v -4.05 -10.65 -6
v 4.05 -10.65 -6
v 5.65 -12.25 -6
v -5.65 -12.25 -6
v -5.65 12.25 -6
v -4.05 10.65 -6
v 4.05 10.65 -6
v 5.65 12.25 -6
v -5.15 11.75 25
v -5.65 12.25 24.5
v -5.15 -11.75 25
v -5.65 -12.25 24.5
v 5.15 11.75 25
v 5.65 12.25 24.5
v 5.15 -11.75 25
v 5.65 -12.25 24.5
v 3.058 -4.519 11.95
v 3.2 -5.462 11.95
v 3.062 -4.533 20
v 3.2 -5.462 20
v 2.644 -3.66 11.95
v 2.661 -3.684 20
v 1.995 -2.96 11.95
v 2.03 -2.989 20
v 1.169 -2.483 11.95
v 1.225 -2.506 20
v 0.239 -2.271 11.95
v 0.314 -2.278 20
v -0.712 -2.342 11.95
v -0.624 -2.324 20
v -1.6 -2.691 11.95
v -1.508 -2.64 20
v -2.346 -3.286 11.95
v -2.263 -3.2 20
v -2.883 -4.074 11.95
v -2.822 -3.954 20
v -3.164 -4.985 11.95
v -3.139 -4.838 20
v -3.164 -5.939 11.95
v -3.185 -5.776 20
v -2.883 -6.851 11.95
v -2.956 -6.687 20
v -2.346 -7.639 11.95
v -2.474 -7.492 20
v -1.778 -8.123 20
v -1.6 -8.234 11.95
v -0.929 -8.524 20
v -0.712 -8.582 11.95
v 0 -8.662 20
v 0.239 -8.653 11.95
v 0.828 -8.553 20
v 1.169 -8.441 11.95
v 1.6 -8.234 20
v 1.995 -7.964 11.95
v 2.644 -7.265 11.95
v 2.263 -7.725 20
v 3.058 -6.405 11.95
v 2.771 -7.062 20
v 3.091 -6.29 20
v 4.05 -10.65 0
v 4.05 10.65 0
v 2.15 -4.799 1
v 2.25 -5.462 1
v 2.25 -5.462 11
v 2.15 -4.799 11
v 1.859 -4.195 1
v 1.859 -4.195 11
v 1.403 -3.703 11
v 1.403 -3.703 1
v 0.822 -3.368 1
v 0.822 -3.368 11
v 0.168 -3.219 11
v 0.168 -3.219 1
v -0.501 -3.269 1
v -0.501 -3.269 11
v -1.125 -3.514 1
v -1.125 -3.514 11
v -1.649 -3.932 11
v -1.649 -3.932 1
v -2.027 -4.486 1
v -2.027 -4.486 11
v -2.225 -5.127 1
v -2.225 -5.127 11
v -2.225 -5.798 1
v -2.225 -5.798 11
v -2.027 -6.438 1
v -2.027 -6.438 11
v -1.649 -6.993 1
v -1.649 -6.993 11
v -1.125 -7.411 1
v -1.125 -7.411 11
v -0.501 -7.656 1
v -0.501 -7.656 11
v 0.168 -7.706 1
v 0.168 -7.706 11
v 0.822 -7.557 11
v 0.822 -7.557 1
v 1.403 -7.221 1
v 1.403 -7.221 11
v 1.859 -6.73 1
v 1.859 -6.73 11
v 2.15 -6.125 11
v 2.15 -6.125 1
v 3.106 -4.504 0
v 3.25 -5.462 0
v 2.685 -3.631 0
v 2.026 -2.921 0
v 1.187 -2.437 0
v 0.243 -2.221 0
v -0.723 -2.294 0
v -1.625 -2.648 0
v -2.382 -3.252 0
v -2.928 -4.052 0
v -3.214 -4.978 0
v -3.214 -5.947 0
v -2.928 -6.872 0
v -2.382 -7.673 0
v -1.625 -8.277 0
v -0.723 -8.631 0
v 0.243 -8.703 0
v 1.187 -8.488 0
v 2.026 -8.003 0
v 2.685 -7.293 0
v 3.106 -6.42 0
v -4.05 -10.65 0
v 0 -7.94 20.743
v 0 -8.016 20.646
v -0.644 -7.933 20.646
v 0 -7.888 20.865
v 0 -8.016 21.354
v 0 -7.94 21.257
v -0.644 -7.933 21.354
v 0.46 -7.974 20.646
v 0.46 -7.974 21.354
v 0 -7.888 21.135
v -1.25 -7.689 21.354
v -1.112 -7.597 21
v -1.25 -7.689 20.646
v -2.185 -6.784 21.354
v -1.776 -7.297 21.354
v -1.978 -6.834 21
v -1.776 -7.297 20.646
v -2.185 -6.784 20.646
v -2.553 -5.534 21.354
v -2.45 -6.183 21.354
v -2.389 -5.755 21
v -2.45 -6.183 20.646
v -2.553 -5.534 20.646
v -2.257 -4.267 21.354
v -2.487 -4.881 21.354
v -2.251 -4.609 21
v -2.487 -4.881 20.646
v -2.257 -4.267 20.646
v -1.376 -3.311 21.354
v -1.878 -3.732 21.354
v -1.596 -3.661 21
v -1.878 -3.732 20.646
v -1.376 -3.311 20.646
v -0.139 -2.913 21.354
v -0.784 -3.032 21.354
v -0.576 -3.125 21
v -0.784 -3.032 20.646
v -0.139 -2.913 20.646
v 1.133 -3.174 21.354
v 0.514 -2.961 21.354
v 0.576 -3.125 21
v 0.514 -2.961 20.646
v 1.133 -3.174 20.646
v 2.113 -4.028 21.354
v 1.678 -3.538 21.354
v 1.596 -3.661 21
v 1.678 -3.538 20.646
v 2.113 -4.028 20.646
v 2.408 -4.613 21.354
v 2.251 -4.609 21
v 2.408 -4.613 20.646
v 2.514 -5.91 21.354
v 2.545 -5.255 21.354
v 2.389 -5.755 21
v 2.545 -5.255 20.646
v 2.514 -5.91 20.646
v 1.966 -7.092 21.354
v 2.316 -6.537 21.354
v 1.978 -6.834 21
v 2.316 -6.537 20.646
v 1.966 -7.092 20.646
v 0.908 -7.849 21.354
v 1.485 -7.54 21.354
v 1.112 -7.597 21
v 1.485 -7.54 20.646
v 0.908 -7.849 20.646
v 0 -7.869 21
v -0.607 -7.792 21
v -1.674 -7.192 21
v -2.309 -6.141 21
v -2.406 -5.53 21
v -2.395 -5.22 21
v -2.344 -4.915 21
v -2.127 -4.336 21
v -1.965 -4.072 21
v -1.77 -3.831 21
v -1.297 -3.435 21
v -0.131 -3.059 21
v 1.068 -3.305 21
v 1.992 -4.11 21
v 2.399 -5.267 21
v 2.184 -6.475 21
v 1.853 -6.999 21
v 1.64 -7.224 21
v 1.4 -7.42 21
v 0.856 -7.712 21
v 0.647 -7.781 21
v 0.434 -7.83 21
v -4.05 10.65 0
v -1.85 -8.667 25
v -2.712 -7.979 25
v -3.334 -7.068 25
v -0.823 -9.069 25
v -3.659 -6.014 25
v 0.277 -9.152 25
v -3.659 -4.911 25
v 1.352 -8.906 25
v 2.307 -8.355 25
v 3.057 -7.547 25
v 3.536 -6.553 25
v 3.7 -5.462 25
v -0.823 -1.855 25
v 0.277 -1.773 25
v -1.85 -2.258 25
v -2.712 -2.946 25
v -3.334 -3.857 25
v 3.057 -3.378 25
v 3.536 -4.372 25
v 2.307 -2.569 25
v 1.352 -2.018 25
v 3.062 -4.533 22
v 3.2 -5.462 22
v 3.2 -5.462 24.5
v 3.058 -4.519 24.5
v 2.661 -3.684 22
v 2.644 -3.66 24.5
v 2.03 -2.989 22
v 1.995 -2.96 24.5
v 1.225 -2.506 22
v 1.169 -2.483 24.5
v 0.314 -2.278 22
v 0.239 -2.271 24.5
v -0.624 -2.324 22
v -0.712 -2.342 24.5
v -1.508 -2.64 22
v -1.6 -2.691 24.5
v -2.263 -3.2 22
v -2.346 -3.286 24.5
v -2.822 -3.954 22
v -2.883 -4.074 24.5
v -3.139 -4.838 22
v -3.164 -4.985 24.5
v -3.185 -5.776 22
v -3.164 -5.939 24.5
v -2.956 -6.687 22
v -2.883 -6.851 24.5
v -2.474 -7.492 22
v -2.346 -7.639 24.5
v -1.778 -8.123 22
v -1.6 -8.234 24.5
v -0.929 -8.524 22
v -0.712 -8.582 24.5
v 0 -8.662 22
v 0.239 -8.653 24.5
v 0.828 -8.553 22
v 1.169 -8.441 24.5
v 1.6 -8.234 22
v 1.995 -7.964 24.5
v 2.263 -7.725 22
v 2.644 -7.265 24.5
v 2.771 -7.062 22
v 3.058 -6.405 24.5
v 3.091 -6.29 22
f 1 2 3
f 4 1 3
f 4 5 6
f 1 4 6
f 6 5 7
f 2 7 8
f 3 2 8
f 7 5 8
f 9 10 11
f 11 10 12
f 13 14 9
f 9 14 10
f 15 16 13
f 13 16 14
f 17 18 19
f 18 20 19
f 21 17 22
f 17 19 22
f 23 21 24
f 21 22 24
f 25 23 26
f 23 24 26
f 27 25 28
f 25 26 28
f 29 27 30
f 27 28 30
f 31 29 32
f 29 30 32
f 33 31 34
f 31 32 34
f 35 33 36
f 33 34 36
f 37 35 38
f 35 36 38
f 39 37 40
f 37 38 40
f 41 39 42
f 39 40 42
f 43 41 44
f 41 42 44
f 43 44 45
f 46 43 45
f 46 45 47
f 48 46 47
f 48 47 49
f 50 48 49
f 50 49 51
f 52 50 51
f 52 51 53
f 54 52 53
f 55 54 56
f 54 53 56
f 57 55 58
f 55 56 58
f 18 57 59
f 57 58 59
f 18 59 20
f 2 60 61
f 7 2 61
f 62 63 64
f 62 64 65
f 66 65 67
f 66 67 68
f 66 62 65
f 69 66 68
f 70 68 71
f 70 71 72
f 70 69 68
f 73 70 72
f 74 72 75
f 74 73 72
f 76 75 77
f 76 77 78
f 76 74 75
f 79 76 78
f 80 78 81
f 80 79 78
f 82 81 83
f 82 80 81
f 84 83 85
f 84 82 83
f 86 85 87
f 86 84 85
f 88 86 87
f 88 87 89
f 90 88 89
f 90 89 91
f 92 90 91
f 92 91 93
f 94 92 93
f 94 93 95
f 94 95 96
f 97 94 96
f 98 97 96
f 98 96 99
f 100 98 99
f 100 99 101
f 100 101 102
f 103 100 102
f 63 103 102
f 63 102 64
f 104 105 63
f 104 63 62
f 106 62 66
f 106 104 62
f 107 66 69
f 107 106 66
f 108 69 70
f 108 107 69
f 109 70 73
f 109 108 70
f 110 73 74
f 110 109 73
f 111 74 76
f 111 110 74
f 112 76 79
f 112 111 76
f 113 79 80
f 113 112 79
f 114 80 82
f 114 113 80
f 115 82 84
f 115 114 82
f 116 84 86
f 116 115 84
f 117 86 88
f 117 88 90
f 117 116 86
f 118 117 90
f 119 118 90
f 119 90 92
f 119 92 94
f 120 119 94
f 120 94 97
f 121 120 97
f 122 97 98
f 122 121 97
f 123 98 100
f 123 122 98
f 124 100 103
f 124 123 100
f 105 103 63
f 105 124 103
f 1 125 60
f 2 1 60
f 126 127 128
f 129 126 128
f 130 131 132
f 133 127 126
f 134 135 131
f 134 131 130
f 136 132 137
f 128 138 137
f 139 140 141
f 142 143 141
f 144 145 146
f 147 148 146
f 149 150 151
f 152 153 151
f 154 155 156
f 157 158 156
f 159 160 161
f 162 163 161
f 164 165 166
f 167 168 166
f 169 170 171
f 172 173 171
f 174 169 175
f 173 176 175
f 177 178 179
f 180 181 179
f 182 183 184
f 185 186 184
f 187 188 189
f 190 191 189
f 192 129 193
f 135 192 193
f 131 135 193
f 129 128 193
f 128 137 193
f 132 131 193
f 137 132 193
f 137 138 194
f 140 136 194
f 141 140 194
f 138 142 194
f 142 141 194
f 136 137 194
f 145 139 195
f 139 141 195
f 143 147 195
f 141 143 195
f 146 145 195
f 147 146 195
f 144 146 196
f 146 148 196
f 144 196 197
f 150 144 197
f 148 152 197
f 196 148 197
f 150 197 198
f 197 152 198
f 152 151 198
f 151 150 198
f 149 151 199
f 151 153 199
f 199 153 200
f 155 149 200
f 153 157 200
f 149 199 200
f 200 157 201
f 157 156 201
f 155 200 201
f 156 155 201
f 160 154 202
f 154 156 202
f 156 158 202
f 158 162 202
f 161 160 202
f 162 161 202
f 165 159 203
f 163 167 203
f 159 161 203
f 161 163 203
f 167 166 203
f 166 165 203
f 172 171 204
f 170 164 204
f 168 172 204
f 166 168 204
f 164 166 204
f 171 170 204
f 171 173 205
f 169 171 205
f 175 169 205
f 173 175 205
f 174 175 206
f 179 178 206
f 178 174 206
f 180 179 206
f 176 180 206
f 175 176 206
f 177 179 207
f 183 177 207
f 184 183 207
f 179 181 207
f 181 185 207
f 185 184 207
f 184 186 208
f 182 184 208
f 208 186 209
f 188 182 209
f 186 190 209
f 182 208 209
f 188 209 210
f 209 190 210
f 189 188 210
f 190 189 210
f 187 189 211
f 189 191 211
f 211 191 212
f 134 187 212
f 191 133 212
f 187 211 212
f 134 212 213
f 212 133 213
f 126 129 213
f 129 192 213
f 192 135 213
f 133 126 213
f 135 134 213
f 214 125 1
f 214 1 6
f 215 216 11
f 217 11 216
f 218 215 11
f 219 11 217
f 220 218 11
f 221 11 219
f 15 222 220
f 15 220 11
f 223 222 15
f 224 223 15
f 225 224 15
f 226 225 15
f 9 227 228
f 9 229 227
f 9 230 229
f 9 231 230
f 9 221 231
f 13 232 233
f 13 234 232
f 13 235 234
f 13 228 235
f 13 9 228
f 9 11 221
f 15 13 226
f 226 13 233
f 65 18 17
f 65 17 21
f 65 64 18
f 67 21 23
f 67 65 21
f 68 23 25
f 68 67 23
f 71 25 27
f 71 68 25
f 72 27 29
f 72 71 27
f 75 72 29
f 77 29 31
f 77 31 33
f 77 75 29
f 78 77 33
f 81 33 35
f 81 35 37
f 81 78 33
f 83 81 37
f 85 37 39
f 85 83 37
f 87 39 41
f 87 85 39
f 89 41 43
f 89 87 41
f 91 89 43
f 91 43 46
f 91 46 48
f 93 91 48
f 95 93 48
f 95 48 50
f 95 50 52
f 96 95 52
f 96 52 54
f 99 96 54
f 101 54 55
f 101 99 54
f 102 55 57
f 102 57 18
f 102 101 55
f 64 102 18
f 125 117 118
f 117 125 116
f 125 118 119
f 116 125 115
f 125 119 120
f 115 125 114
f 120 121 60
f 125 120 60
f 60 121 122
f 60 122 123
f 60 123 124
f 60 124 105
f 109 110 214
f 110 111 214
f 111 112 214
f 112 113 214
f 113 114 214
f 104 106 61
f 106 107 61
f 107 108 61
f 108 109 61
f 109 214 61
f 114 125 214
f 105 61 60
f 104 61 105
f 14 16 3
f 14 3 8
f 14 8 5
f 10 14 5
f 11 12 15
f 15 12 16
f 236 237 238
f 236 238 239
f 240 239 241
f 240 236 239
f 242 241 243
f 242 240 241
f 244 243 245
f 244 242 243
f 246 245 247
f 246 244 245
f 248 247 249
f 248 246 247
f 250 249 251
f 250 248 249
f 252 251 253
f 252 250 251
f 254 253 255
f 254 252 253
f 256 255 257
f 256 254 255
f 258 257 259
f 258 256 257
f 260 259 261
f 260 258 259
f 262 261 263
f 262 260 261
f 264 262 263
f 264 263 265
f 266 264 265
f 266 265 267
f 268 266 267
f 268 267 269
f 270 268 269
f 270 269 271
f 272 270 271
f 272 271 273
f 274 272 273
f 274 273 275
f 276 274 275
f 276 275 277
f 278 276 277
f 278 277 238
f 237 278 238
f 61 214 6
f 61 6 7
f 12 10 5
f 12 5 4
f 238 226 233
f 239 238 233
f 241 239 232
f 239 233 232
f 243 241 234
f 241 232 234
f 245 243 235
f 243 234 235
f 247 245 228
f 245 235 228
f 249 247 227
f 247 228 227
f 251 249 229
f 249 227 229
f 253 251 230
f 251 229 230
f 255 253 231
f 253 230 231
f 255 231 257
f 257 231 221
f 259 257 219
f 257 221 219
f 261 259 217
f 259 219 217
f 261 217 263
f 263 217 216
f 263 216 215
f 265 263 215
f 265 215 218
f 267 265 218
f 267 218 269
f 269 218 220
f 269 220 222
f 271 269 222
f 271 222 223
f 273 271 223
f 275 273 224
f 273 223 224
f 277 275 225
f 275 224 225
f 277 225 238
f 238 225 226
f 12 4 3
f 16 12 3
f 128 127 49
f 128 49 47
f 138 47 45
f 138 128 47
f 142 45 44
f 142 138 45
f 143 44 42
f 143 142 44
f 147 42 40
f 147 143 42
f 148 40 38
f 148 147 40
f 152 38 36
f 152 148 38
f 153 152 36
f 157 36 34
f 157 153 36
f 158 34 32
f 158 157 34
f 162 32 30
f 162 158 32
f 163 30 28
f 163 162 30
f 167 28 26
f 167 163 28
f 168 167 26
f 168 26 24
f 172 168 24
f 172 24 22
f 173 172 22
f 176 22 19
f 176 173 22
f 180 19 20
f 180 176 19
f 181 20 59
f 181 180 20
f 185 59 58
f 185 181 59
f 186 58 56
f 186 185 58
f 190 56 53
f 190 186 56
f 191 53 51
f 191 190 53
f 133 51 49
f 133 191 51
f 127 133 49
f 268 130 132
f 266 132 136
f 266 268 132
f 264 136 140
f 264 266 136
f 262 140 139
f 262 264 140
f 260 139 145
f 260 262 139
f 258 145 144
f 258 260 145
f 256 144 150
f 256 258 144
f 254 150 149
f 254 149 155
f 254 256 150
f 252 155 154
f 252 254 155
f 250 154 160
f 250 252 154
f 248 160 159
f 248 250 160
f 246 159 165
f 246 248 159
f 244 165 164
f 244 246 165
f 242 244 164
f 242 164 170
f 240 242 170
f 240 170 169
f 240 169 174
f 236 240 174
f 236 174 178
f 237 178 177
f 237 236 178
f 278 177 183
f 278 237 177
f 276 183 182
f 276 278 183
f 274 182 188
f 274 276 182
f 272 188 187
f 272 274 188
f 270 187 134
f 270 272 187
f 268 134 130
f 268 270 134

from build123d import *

# Parameters (mm, degrees)
F0_W         = 11.3
F0_H         = 24.5
F0_W_2       = 8.1
F0_H_2       = 21.3
F1_DEPTH     = 1
F2_DEPTH     = 6
F3_R         = 3.2
F4_DEPTH     = 24
F5_DEPTH     = 28.9
F8_R         = 0.5
F9_SIZE      = 0.5
F10_R        = 3.2
F10_R_2      = 2.25
F11_DEPTH    = 12
F12_S5_R     = 3.2
F12_T6_DEPTH = 6
F13_SIZE     = 1


# Not quite as in the source:
# - a fillet or chamfer that OpenCascade refuses, or shapes differently, is made with other operations: its cross-section is extruded or revolved along the edge and cut away or added


with BuildPart() as f1:
    # F0 (on Top) → F1 (new body)
    with BuildSketch(Plane.XY):
        Rectangle(F0_W, F0_H)
        Rectangle(F0_W_2, F0_H_2, mode=Mode.SUBTRACT)
        Rectangle(F0_W_2, F0_H_2)
    extrude(amount=F1_DEPTH)

    # F0 (on Top) → F2 (join)
    with BuildSketch(Plane.XY):
        Rectangle(F0_W, F0_H)
        Rectangle(F0_W_2, F0_H_2, mode=Mode.SUBTRACT)
    extrude(amount=-F2_DEPTH)

    # F3 (on face) → F4 (join)
    with BuildSketch(Plane.XY.offset(1)):
        with BuildLine():
            ThreePointArc((-5.65, -5.4622520893), (1e-08, -11.1122520693), (5.65, -5.4622520693))
            ThreePointArc((5.65, -5.4622520693), (-1e-08, 0.1877479307), (-5.65, -5.4622520893))
        make_face()
        with Locations((0, -5.4622520693)):
            Circle(F3_R, mode=Mode.SUBTRACT)
        with BuildLine():
            Line((5.65, -12.25), (5.65, -5.4622520693))
            ThreePointArc((5.65, -5.4622520693), (1e-08, -11.1122520693), (-5.65, -5.4622520893))
            Line((-5.65, -5.4622520893), (-5.65, -12.25))
            Line((-5.65, -12.25), (5.65, -12.25))
        make_face()
        with BuildLine():
            ThreePointArc((-5.65, -5.4622520893), (-1e-08, 0.1877479307), (5.65, -5.4622520693))
            Line((5.65, -5.4622520693), (5.65, 12.25))
            Line((5.65, 12.25), (-5.65, 12.25))
            Line((-5.65, 12.25), (-5.65, -5.4622520893))
        make_face()
    extrude(amount=F4_DEPTH)

    # F5 (cut): a face of the model
    f5_faces = [f1.faces().sort_by_distance(p)[0] for p in [
        (0, -5.4622520693, 1),
    ]]
    extrude(f5_faces, amount=-F5_DEPTH, mode=Mode.SUBTRACT)

    # F6 (on Right) → F7 (revolve)
    with BuildSketch(Plane.YZ):
        Polygon((-8.6622520693, 22), (-8.6622520693, 20), (-7.6622520693, 21), align=None)
    revolve(axis=Axis((0, -5.4622520693, 1), (0, 0, -1)))

    # F8
    f8_edges = [f1.edges().sort_by_distance(p)[0] for p in [
        (0, -3.262252, 21),
    ]]
    fillet(f8_edges, radius=F8_R)

    # F9
    f9_edges = [f1.edges().sort_by_distance(p)[0] for p in [
        (-5.65, 0, 25),
        (0, -12.25, 25),
        (5.65, 0, 25),
        (0, 12.25, 25),
        (-3.2, -5.462252, 25),
    ]]
    chamfer(f9_edges, length=F9_SIZE)

    # F10 (on face) → F11 (join)
    with BuildSketch(Plane.XY):
        with Locations((0, -5.4622520693)):
            Circle(F10_R)
        with Locations((0, -5.4622520693)):
            Circle(F10_R_2, mode=Mode.SUBTRACT)
    extrude(amount=F11_DEPTH)

    # F12: chamfer of 1 on 1 edges, made by hand


with BuildPart() as f12_tool2:
    # F12_s3 → F12_t4 (revolve)
    with BuildSketch(Plane.XZ.offset(5.4622520693)):
        Polygon((3.25, 12), (2.25, 11), (2.25, 12), align=None)
    revolve(axis=Axis((0, -5.4622520693, 12), (0, 0, 1)))

    # F12_s5 → F12_t6 (intersect, symmetric)
    with BuildSketch(Plane.XY.offset(11.5)):
        with Locations((0, -5.4622520693)):
            Circle(F12_S5_R)
    extrude(amount=F12_T6_DEPTH, both=True, mode=Mode.INTERSECT)


with BuildPart() as f1_1:
    add(f1.part)

    # F12_t1: cut F12_tool2
    add(f12_tool2.part, mode=Mode.SUBTRACT)

    # F13
    f13_edges = [f1_1.edges().sort_by_distance(p)[0] for p in [
        (-2.25, -5.462252, 0),
    ]]
    chamfer(f13_edges, length=F13_SIZE)


solid = f1_1.part
